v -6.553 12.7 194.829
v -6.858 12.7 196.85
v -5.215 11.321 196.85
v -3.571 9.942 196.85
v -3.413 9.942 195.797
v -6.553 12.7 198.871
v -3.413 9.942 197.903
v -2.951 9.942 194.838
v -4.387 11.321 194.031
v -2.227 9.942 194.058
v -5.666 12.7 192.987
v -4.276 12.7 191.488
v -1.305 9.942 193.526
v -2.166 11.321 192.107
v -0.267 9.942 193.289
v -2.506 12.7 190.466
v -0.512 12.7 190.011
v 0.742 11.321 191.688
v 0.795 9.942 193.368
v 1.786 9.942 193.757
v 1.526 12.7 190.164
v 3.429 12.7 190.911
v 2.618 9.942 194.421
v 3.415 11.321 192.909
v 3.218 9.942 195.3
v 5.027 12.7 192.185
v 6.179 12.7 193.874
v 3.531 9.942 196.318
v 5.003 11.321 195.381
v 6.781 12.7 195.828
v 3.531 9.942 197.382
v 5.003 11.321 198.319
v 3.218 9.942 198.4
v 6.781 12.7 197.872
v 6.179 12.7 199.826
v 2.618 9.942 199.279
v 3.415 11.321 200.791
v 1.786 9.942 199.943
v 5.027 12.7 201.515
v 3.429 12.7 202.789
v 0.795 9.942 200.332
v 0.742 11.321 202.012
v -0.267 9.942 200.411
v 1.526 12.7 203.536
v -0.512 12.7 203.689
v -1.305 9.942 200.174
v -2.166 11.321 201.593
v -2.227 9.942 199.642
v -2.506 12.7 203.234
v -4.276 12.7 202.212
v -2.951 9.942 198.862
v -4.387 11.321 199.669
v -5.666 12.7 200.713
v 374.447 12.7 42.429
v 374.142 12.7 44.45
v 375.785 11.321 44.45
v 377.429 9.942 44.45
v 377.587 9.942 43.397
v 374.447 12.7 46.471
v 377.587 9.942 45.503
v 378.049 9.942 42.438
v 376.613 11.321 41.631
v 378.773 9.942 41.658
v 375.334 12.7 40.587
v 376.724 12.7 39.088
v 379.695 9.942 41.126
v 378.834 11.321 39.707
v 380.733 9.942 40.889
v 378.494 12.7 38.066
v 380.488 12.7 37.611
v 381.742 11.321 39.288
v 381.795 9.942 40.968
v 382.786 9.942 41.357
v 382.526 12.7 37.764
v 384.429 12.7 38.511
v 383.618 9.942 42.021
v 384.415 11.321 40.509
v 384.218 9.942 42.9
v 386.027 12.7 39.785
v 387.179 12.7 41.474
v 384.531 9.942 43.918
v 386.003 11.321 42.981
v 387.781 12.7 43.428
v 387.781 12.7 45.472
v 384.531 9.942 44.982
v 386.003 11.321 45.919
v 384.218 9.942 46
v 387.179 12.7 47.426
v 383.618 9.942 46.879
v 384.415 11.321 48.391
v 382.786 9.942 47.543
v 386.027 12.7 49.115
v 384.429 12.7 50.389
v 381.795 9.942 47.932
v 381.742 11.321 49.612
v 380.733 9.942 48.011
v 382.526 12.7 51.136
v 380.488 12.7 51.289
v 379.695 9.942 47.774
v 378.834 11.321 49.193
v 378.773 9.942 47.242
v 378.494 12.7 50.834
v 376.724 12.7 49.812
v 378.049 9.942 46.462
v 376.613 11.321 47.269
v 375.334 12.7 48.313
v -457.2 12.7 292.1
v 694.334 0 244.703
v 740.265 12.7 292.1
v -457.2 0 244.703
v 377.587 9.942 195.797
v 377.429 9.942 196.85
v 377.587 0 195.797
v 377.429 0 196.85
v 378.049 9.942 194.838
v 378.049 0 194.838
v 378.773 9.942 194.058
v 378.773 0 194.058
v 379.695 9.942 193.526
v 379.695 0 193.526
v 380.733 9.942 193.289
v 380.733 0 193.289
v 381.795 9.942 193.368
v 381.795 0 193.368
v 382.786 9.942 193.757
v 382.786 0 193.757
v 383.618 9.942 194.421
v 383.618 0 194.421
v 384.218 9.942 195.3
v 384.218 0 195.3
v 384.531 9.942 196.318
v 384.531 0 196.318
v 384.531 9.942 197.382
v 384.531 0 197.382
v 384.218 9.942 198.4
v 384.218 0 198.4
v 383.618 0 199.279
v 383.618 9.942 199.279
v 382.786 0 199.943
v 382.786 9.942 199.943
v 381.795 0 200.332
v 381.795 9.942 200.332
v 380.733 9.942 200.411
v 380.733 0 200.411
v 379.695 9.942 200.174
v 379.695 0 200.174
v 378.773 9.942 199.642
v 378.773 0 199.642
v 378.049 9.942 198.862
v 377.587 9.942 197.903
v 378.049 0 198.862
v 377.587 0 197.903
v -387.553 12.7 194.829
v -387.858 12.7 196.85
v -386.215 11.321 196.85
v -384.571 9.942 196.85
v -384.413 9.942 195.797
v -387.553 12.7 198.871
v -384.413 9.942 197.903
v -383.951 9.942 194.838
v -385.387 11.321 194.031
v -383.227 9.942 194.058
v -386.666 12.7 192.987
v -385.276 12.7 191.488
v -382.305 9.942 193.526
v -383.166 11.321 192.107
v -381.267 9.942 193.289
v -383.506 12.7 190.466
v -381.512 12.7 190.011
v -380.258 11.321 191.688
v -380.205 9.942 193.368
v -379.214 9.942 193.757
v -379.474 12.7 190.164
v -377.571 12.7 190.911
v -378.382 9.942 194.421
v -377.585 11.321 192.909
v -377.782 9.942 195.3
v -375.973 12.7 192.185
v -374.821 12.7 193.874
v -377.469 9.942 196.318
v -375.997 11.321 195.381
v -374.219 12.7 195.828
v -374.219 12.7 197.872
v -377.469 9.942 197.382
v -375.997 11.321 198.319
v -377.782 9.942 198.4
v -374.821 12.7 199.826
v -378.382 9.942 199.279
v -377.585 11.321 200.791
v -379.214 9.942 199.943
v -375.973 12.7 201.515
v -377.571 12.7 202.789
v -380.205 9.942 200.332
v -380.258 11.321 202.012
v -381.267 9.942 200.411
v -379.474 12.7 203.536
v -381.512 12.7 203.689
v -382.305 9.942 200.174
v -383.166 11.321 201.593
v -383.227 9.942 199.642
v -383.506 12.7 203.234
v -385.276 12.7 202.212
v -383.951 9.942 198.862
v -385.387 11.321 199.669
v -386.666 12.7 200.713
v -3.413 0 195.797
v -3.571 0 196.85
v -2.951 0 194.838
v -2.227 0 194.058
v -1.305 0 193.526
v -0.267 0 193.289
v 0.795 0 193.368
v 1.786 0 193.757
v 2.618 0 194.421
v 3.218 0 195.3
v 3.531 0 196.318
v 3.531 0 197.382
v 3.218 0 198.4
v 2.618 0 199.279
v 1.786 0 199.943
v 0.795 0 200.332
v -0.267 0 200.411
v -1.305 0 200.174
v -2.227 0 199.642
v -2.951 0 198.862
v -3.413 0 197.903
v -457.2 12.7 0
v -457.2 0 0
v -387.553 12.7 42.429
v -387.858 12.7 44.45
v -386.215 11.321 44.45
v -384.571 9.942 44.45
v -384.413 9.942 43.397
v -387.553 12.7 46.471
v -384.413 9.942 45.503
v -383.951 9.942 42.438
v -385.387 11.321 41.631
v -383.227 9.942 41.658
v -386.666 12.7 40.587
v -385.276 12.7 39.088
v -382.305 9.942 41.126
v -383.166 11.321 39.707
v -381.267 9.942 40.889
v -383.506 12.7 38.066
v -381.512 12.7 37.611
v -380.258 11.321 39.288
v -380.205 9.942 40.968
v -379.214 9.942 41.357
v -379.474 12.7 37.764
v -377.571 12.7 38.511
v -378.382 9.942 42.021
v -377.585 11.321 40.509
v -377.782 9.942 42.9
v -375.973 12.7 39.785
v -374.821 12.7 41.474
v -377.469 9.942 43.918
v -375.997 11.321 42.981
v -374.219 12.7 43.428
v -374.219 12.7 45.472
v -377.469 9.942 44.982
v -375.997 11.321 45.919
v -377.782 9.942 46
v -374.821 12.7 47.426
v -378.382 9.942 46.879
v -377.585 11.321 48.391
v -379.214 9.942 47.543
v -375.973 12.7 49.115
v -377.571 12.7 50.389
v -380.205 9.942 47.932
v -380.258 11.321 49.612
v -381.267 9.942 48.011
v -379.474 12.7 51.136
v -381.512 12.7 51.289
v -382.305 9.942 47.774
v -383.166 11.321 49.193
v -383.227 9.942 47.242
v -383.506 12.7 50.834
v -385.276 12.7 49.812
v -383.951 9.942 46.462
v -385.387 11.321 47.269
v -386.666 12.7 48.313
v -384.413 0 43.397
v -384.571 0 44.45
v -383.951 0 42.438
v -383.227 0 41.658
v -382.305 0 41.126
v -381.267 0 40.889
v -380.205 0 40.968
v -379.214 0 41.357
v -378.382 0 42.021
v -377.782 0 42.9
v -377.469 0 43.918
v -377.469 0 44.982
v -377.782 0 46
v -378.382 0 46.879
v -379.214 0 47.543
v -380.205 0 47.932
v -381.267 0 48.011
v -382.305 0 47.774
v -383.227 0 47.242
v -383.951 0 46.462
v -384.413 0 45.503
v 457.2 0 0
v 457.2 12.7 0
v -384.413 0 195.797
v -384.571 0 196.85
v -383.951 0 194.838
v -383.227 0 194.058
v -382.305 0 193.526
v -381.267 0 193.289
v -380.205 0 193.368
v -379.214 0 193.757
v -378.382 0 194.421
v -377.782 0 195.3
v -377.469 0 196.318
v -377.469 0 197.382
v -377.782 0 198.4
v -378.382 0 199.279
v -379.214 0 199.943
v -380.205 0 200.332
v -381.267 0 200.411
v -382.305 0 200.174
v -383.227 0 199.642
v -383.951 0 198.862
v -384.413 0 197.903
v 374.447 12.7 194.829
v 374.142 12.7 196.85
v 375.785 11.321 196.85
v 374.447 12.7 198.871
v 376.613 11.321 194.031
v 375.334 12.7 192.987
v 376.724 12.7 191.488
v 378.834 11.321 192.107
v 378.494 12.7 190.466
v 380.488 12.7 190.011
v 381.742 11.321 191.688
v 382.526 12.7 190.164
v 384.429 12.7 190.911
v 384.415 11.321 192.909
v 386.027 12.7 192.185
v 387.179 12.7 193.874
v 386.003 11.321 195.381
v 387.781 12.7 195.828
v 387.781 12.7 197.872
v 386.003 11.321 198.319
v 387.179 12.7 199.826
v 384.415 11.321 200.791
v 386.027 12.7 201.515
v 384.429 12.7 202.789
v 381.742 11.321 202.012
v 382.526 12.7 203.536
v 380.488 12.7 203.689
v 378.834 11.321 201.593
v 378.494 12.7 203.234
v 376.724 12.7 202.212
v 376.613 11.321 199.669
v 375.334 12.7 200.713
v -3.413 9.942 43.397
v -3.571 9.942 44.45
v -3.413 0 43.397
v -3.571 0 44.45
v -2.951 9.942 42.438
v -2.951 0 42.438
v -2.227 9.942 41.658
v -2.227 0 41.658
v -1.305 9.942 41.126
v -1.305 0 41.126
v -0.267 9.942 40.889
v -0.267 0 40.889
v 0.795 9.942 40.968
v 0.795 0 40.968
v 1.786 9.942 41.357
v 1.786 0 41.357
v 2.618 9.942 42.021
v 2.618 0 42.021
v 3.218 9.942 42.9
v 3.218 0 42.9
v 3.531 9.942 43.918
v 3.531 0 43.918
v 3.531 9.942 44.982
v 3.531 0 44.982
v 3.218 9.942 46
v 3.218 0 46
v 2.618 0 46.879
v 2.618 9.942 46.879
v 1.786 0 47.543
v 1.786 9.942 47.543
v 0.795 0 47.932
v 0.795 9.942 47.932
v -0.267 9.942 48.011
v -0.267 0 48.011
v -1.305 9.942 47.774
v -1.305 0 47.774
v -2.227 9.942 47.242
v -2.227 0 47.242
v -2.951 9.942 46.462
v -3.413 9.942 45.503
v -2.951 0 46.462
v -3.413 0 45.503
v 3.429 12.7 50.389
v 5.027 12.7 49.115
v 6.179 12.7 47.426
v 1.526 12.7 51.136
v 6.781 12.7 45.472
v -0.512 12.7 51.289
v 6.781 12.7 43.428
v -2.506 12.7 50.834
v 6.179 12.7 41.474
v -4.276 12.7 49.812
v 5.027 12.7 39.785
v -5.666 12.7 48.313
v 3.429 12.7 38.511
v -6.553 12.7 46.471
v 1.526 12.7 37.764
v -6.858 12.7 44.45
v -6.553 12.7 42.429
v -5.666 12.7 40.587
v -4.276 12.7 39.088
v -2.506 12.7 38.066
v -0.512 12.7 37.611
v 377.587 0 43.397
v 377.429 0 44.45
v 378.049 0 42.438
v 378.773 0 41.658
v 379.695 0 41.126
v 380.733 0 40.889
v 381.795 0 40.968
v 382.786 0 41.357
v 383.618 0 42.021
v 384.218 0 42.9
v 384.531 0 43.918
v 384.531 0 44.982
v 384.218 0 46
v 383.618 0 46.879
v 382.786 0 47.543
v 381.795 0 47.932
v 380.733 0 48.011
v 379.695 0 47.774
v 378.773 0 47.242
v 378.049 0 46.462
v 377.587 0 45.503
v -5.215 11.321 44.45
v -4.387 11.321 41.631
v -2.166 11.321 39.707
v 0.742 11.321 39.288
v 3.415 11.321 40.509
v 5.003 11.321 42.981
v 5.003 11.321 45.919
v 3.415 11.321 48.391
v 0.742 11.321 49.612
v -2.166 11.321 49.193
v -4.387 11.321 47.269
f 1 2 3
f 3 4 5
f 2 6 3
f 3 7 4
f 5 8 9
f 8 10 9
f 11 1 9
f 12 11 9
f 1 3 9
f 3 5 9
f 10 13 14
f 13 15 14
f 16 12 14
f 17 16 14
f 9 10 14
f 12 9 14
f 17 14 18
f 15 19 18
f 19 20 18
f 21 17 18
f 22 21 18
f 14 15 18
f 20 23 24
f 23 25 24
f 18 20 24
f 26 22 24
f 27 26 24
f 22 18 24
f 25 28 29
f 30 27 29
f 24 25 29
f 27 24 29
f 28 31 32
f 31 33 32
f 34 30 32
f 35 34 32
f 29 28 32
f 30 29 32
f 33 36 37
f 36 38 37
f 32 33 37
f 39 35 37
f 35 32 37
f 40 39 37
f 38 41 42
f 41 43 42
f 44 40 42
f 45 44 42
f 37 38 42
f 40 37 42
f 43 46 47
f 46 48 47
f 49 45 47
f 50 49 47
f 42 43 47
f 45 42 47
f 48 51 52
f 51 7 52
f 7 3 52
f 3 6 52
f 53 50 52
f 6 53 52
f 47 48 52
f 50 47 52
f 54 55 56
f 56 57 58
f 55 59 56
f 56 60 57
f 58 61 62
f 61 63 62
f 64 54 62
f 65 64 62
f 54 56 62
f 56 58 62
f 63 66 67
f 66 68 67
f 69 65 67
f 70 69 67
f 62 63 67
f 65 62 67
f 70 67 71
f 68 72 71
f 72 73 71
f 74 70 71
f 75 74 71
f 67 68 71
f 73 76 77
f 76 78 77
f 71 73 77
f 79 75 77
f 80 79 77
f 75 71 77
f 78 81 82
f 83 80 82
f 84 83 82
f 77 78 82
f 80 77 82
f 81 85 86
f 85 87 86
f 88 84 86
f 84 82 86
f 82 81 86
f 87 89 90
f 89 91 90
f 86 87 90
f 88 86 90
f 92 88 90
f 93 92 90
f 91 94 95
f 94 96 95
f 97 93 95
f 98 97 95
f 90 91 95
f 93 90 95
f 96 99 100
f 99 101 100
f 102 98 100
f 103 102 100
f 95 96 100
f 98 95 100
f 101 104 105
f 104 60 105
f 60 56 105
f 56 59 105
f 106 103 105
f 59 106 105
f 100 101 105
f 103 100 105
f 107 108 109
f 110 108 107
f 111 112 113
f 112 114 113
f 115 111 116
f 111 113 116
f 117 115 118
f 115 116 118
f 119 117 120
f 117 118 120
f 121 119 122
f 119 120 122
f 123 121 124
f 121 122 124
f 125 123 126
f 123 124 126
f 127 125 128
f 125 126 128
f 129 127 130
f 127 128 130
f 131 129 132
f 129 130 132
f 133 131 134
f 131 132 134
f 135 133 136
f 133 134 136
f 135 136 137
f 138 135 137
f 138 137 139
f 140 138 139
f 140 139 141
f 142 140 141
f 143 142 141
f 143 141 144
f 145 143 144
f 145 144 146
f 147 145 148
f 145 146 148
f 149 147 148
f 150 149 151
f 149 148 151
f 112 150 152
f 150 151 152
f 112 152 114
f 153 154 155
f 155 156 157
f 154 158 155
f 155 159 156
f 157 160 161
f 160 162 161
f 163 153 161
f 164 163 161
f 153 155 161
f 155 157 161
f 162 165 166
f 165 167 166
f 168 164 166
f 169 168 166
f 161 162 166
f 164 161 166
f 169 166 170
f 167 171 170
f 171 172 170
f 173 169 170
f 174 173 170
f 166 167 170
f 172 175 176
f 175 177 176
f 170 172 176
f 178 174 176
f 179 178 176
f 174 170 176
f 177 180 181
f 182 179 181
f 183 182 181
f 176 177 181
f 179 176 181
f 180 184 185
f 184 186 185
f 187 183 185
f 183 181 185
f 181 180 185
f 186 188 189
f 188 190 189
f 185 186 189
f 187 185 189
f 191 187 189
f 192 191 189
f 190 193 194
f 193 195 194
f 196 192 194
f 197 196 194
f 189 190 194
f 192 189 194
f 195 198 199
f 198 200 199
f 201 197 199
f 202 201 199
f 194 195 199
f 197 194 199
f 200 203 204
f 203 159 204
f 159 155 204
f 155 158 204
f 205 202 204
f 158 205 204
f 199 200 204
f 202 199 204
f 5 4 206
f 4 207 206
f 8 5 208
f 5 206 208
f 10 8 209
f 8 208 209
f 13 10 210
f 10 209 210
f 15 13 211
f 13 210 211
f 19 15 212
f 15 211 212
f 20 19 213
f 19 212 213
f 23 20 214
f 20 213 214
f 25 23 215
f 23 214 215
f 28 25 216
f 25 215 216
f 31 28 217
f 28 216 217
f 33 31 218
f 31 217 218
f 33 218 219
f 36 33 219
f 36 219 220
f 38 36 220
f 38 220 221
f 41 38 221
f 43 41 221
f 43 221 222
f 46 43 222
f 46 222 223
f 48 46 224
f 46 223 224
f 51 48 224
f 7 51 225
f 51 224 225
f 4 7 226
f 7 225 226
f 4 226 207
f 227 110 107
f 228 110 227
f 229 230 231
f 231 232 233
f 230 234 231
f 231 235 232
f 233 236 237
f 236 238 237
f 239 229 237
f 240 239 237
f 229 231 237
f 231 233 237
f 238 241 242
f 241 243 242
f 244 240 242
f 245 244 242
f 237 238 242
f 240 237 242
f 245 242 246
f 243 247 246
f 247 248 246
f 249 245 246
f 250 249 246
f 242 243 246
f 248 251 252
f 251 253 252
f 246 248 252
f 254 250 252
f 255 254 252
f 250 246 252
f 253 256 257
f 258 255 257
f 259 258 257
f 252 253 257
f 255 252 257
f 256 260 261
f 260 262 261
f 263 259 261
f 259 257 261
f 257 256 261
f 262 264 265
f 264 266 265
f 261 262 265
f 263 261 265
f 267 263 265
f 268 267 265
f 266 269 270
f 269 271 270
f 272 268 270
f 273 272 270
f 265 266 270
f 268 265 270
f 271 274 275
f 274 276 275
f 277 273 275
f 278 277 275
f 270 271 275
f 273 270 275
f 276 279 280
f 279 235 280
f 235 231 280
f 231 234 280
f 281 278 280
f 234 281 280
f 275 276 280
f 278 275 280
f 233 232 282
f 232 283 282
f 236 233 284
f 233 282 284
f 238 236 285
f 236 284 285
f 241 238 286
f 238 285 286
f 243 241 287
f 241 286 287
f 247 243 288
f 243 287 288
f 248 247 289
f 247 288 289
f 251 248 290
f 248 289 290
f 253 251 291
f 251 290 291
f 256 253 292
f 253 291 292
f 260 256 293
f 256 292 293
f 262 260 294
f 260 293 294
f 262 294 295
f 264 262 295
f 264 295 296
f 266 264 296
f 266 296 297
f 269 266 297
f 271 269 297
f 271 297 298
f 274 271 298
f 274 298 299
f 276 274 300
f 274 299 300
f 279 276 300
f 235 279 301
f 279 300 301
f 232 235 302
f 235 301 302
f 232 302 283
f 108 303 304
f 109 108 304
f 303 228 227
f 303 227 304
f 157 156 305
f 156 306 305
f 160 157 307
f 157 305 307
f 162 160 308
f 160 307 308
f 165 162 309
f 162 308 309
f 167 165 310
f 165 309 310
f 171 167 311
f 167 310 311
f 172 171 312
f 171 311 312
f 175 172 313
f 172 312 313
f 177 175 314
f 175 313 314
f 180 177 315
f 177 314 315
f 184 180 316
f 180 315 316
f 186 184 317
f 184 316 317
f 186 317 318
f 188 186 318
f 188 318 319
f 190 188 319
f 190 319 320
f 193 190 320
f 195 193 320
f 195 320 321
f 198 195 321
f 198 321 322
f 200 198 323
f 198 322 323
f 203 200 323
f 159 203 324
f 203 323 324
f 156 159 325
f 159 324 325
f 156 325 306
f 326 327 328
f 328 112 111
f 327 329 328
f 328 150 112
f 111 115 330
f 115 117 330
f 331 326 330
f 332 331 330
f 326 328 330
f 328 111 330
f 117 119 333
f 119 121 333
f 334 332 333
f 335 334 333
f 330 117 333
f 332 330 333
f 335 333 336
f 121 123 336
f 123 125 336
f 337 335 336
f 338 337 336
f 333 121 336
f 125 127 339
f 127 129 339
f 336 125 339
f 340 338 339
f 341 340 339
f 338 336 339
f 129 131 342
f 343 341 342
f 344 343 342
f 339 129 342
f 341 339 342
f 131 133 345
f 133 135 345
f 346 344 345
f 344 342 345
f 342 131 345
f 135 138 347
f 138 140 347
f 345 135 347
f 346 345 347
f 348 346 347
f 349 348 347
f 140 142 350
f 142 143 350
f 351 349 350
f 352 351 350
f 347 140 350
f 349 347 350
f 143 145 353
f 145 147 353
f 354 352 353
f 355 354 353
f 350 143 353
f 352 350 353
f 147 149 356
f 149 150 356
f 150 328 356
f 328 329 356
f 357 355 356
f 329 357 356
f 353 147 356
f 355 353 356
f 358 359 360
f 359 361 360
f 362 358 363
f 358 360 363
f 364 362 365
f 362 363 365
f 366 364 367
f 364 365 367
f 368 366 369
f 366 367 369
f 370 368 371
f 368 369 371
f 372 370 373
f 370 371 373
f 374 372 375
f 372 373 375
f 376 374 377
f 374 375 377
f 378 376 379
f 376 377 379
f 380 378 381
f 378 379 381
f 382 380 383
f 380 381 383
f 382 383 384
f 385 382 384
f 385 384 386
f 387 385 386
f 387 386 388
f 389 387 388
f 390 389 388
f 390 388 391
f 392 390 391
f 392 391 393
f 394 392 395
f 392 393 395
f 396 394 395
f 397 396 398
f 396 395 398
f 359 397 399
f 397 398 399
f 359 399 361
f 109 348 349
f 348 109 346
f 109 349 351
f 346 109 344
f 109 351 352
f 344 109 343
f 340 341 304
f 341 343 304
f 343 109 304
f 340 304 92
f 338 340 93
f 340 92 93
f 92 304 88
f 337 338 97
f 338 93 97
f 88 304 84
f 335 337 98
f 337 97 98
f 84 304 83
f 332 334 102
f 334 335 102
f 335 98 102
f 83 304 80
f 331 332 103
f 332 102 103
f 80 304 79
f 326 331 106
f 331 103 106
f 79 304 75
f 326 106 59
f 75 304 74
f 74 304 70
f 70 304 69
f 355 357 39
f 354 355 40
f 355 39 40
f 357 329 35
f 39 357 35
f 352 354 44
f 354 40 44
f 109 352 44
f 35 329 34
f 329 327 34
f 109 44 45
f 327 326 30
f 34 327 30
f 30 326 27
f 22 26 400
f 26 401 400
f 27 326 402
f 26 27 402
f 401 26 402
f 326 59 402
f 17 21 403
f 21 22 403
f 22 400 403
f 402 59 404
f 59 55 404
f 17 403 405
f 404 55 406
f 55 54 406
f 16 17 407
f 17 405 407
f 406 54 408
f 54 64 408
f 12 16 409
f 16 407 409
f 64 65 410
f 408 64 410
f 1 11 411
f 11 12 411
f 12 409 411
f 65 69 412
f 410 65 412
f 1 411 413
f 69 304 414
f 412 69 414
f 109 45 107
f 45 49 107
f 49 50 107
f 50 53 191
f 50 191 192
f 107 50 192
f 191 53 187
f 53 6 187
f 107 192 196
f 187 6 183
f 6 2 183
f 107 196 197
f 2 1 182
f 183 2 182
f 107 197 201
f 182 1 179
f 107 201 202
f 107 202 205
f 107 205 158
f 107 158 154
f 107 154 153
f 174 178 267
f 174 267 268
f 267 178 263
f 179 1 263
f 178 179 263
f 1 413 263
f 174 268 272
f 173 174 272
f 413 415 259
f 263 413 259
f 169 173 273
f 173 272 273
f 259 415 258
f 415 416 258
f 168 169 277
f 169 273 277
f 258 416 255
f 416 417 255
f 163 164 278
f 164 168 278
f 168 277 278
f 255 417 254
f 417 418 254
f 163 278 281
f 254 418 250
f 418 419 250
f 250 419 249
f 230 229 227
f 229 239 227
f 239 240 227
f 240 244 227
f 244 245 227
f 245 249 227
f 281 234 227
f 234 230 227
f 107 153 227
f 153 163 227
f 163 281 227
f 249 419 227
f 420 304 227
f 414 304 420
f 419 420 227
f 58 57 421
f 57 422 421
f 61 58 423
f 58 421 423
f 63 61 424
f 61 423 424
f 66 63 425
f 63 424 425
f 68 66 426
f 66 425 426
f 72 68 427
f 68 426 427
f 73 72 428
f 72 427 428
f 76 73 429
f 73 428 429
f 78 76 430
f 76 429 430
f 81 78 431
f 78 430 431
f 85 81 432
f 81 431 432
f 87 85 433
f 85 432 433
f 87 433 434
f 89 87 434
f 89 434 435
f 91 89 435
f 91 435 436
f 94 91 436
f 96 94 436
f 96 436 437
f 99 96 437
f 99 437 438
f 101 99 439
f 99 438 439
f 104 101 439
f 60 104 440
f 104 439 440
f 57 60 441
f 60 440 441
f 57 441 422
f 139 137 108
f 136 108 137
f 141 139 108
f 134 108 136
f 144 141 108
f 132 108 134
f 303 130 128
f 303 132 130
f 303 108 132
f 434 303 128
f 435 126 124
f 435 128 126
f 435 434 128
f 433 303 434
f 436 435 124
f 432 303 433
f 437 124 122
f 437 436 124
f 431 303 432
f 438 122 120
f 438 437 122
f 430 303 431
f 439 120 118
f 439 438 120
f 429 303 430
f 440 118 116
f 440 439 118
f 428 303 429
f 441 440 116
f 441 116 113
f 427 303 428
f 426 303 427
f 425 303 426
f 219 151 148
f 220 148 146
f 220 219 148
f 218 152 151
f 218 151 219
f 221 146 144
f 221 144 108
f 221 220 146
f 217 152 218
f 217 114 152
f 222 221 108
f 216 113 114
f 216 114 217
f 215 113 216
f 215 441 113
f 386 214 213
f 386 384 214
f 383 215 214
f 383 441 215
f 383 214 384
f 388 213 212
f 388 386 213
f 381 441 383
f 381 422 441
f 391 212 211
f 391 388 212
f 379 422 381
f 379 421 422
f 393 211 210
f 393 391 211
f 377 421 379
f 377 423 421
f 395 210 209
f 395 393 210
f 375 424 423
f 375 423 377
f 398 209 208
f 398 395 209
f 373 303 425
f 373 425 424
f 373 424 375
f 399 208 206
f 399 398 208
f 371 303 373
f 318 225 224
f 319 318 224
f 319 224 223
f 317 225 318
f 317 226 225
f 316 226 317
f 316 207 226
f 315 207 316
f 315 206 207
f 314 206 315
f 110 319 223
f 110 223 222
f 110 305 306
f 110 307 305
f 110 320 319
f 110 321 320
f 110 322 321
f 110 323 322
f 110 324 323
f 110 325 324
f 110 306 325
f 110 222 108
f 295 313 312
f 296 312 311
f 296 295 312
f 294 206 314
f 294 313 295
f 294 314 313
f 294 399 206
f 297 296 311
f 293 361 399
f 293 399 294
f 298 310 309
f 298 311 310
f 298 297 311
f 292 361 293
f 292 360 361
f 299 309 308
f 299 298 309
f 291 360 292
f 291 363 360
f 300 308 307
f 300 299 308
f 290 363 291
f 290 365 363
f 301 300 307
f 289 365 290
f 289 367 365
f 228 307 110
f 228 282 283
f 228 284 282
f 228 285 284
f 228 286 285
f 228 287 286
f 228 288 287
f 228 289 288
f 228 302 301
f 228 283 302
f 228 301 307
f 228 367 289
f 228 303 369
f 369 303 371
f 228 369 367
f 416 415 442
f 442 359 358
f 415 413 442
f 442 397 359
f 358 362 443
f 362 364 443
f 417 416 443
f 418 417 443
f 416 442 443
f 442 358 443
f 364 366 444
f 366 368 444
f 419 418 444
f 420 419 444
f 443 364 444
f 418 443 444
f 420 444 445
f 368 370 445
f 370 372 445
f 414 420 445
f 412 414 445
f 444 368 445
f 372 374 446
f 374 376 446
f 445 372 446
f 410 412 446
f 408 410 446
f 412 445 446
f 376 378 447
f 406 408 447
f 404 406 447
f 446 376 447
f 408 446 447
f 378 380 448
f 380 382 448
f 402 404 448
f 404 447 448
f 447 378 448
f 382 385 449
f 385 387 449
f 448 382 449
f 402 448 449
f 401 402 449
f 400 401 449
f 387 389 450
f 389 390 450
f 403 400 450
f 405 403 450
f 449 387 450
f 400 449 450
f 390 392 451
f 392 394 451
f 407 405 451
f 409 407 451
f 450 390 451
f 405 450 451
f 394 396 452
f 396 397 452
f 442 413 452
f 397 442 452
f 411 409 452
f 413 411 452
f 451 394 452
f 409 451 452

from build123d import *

# Parameters (mm, degrees)
BOSS_EXTRUDE1_DEPTH                                 = 12.7
CHAMFER1_SIZE2                                      = 47.397045256
CHAMFER1_SIZE                                       = 12.7
CSK_FOR_1_4_FLAT_HEAD_MACHINE_SCREW_100_D           = 7.14248
CSK_FOR_1_4_FLAT_HEAD_MACHINE_SCREW_100_CSINK_D     = 13.716
CSK_FOR_1_4_FLAT_HEAD_MACHINE_SCREW_100_CSINK_ANGLE = 100
LPATTERN1_COUNT                                     = 3
LPATTERN1_PITCH                                     = 381


with BuildPart() as part:
    # Sketch1 → Boss-Extrude1 (new body)
    with BuildSketch(Plane(origin=(0, 0, 0), x_dir=(1, 0, 0), z_dir=(0, 1, 0))):
        Polygon((-457.2, 0), (457.2, 0), (740.264592562, -292.1), (-457.2, -292.1), align=None)
    extrude(amount=BOSS_EXTRUDE1_DEPTH)

    # Chamfer1
    chamfer1_edges = [part.edges().sort_by_distance(p)[0] for p in [
        (141.532296281, 0, 292.1),
    ]]
    chamfer1_side = [part.faces().sort_by_distance(p)[0] for p in [
        (141.532296281, 0.254, 292.1),
    ]]
    chamfer(chamfer1_edges, length=CHAMFER1_SIZE - 0.0001, length2=CHAMFER1_SIZE2 - 0.0001, reference=chamfer1_side[0])  # a hair under: the kernel refuses the full size

    # CSK for 1/4 Flat Head Machine Screw (100)1 (through all)
    with Locations(Plane(origin=(0, 12.7, 0), x_dir=(1, 0, 0), z_dir=(0, 1, 0))):
        with Locations((-381, -44.45), (-381, -196.85)):
            csk_for_1_4_flat_head_machine_screw_100 = CounterSinkHole(CSK_FOR_1_4_FLAT_HEAD_MACHINE_SCREW_100_D / 2, CSK_FOR_1_4_FLAT_HEAD_MACHINE_SCREW_100_CSINK_D / 2, counter_sink_angle=CSK_FOR_1_4_FLAT_HEAD_MACHINE_SCREW_100_CSINK_ANGLE)

    # LPattern1: CSK for 1/4 Flat Head Machine Screw (100)1 ×3
    with Locations(*[(i * LPATTERN1_PITCH, 0, 0) for i in range(1, LPATTERN1_COUNT)]):
        add(csk_for_1_4_flat_head_machine_screw_100, mode=Mode.SUBTRACT)


solid = part.part
